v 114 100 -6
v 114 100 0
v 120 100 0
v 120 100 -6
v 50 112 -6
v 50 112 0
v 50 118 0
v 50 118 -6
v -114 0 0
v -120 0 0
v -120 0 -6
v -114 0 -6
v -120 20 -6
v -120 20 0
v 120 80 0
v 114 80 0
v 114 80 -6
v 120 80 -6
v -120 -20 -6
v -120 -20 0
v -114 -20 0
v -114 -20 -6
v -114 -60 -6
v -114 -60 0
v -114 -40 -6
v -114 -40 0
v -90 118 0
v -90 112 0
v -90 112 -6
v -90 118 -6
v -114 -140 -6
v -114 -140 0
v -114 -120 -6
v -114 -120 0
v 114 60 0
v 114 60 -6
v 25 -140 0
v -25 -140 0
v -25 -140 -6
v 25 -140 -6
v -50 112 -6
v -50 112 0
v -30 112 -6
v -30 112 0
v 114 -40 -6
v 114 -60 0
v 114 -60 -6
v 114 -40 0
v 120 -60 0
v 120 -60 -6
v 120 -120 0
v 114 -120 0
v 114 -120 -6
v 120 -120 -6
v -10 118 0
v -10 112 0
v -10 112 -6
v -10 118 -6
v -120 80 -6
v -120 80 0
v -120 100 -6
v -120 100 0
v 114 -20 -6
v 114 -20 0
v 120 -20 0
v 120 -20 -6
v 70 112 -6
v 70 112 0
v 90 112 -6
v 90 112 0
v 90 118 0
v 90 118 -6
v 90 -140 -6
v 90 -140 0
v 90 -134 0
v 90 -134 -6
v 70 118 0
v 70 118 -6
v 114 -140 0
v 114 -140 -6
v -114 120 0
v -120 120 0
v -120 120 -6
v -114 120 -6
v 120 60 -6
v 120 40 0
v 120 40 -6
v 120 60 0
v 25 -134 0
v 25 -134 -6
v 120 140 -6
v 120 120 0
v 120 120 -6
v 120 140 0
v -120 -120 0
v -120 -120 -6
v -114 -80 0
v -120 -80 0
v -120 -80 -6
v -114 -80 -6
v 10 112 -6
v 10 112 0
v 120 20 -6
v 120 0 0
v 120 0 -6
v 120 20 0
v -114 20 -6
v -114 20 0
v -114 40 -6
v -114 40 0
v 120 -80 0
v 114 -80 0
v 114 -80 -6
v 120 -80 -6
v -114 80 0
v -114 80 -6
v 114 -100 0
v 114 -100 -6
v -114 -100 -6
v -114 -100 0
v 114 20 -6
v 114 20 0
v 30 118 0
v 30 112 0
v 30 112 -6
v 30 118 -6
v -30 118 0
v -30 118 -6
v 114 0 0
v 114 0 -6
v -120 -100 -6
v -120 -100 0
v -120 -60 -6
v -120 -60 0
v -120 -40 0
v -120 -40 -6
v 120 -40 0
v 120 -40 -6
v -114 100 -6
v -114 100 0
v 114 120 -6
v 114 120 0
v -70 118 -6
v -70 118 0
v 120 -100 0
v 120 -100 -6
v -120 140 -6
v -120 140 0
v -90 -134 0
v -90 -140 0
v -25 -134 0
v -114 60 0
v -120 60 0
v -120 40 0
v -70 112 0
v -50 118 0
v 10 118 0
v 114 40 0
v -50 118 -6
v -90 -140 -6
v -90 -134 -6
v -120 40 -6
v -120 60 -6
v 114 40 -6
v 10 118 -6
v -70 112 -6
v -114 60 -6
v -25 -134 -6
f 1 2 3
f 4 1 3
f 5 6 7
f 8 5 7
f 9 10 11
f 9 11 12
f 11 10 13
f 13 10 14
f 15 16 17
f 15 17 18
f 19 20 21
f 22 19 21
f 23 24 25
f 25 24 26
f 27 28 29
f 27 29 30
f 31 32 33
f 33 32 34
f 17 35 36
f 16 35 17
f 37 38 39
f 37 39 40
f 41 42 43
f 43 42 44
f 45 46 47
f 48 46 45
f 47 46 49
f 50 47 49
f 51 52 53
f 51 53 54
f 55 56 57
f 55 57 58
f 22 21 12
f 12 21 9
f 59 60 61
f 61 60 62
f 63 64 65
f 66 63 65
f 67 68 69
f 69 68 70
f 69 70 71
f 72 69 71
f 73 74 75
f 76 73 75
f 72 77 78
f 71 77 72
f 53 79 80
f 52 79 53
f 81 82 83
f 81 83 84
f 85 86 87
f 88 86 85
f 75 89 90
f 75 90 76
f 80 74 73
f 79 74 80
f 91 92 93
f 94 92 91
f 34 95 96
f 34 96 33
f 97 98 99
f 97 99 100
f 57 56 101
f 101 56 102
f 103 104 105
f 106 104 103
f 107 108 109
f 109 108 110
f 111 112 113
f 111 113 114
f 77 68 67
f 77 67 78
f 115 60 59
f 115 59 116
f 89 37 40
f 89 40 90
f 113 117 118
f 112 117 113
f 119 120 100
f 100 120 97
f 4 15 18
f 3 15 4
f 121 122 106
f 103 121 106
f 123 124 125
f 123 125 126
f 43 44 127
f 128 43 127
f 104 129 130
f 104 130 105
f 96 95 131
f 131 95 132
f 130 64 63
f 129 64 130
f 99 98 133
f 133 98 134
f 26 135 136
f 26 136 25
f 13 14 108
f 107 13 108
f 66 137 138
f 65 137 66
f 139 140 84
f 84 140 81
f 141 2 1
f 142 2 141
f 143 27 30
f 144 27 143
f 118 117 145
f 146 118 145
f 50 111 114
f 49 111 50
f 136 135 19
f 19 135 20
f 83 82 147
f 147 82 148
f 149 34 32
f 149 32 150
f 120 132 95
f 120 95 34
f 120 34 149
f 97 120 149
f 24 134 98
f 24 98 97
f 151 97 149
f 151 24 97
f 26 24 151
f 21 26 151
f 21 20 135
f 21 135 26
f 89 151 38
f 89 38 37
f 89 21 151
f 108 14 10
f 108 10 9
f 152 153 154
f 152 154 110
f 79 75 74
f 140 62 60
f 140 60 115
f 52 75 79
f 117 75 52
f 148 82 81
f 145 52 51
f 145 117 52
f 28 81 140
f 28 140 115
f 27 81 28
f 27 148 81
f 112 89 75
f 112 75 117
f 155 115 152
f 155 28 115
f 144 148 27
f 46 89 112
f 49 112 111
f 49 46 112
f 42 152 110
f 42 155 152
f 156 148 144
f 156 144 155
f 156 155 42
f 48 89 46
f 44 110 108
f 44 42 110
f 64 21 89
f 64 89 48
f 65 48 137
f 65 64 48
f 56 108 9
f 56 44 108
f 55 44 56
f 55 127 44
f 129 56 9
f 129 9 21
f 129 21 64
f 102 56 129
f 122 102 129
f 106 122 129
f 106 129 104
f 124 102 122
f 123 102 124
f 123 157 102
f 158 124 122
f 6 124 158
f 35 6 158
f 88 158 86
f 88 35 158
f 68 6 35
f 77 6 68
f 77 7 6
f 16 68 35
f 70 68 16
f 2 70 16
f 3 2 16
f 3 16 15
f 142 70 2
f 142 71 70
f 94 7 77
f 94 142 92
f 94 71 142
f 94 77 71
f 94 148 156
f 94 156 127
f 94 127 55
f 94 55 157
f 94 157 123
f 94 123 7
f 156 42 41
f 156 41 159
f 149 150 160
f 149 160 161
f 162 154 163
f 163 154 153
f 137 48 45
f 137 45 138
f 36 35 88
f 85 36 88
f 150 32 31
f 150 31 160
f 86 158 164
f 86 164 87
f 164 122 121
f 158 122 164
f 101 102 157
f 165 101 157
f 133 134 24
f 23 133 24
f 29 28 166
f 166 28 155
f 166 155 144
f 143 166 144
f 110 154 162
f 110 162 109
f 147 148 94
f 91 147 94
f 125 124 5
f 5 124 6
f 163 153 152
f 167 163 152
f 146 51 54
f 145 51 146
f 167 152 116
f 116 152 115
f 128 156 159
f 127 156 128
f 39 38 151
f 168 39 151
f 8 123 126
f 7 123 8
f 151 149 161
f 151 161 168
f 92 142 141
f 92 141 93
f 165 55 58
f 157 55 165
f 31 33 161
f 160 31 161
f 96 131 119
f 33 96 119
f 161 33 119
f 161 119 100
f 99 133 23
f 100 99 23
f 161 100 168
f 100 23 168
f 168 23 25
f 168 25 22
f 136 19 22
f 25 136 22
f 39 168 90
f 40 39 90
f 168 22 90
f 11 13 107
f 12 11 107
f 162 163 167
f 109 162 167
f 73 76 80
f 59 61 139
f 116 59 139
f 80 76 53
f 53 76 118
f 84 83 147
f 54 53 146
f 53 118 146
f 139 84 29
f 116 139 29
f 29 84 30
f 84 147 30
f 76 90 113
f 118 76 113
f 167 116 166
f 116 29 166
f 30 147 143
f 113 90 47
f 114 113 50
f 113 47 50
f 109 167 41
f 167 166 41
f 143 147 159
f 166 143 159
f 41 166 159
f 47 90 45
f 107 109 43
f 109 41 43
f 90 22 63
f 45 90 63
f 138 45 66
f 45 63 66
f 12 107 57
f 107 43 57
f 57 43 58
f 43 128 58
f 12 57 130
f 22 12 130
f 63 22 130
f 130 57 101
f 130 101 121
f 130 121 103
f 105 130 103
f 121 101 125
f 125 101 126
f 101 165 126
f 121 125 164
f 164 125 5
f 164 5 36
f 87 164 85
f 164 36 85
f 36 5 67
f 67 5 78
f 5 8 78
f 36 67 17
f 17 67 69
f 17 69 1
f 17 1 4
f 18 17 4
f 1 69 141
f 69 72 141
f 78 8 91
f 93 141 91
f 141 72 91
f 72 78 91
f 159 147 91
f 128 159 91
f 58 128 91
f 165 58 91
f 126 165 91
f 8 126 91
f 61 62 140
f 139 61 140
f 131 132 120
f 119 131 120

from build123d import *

# Parameters (mm, degrees)
SKETCH1_W           = 240
SKETCH1_H           = 280
BOSS_EXTRUDE1_DEPTH = 6
SKETCH3_W           = 6
SKETCH3_H           = 20
CUT_EXTRUDE1_DEPTH  = 6
SKETCH4_W           = 6
SKETCH4_H           = 20
SKETCH4_W_2         = 65
SKETCH4_H_2         = 6
CUT_EXTRUDE2_DEPTH  = 6
SKETCH5_W           = 20
SKETCH5_H           = 6
CUT_EXTRUDE3_DEPTH  = 6


with BuildPart() as part:
    # Sketch1 → Boss-Extrude1 (new body)
    with BuildSketch(Plane.XY):
        Rectangle(SKETCH1_W, SKETCH1_H)
    extrude(amount=-BOSS_EXTRUDE1_DEPTH)

    # Sketch3 → Cut-Extrude1 (cut)
    with BuildSketch(Plane.XY):
        with Locations((117, 110)):
            Rectangle(SKETCH3_W, SKETCH3_H)
        with Locations((117, 70)):
            Rectangle(SKETCH3_W, SKETCH3_H)
        with Locations((117, 30)):
            Rectangle(SKETCH3_W, SKETCH3_H)
        with Locations((117, -10)):
            Rectangle(SKETCH3_W, SKETCH3_H)
        with Locations((117, -50)):
            Rectangle(SKETCH3_W, SKETCH3_H)
        with Locations((-117, 110)):
            Rectangle(SKETCH3_W, SKETCH3_H)
        with Locations((-117, 70)):
            Rectangle(SKETCH3_W, SKETCH3_H)
        with Locations((-117, 30)):
            Rectangle(SKETCH3_W, SKETCH3_H)
        with Locations((-117, -10)):
            Rectangle(SKETCH3_W, SKETCH3_H)
        with Locations((-117, -50)):
            Rectangle(SKETCH3_W, SKETCH3_H)
        with Locations((117, -90)):
            Rectangle(SKETCH3_W, SKETCH3_H)
        with Locations((-117, -90)):
            Rectangle(SKETCH3_W, SKETCH3_H)
    extrude(amount=-CUT_EXTRUDE1_DEPTH, mode=Mode.SUBTRACT)

    # Sketch4 → Cut-Extrude2 (cut)
    with BuildSketch(Plane.XY):
        with Locations((117, -130)):
            Rectangle(SKETCH4_W, SKETCH4_H)
        with Locations((57.5, -137)):
            Rectangle(SKETCH4_W_2, SKETCH4_H_2)
        with Locations((-57.5, -137)):
            Rectangle(SKETCH4_W_2, SKETCH4_H_2)
        with Locations((-117, -130)):
            Rectangle(SKETCH4_W, SKETCH4_H)
    extrude(amount=-CUT_EXTRUDE2_DEPTH, mode=Mode.SUBTRACT)

    # Sketch5 → Cut-Extrude3 (cut)
    with BuildSketch(Plane.XY):
        with Locations((0, 115)):
            Rectangle(SKETCH5_W, SKETCH5_H)
        with Locations((-80, 115)):
            Rectangle(SKETCH5_W, SKETCH5_H)
        with Locations((40, 115)):
            Rectangle(SKETCH5_W, SKETCH5_H)
        with Locations((80, 115)):
            Rectangle(SKETCH5_W, SKETCH5_H)
        with Locations((-40, 115)):
            Rectangle(SKETCH5_W, SKETCH5_H)
    extrude(amount=-CUT_EXTRUDE3_DEPTH, mode=Mode.SUBTRACT)


solid = part.part
